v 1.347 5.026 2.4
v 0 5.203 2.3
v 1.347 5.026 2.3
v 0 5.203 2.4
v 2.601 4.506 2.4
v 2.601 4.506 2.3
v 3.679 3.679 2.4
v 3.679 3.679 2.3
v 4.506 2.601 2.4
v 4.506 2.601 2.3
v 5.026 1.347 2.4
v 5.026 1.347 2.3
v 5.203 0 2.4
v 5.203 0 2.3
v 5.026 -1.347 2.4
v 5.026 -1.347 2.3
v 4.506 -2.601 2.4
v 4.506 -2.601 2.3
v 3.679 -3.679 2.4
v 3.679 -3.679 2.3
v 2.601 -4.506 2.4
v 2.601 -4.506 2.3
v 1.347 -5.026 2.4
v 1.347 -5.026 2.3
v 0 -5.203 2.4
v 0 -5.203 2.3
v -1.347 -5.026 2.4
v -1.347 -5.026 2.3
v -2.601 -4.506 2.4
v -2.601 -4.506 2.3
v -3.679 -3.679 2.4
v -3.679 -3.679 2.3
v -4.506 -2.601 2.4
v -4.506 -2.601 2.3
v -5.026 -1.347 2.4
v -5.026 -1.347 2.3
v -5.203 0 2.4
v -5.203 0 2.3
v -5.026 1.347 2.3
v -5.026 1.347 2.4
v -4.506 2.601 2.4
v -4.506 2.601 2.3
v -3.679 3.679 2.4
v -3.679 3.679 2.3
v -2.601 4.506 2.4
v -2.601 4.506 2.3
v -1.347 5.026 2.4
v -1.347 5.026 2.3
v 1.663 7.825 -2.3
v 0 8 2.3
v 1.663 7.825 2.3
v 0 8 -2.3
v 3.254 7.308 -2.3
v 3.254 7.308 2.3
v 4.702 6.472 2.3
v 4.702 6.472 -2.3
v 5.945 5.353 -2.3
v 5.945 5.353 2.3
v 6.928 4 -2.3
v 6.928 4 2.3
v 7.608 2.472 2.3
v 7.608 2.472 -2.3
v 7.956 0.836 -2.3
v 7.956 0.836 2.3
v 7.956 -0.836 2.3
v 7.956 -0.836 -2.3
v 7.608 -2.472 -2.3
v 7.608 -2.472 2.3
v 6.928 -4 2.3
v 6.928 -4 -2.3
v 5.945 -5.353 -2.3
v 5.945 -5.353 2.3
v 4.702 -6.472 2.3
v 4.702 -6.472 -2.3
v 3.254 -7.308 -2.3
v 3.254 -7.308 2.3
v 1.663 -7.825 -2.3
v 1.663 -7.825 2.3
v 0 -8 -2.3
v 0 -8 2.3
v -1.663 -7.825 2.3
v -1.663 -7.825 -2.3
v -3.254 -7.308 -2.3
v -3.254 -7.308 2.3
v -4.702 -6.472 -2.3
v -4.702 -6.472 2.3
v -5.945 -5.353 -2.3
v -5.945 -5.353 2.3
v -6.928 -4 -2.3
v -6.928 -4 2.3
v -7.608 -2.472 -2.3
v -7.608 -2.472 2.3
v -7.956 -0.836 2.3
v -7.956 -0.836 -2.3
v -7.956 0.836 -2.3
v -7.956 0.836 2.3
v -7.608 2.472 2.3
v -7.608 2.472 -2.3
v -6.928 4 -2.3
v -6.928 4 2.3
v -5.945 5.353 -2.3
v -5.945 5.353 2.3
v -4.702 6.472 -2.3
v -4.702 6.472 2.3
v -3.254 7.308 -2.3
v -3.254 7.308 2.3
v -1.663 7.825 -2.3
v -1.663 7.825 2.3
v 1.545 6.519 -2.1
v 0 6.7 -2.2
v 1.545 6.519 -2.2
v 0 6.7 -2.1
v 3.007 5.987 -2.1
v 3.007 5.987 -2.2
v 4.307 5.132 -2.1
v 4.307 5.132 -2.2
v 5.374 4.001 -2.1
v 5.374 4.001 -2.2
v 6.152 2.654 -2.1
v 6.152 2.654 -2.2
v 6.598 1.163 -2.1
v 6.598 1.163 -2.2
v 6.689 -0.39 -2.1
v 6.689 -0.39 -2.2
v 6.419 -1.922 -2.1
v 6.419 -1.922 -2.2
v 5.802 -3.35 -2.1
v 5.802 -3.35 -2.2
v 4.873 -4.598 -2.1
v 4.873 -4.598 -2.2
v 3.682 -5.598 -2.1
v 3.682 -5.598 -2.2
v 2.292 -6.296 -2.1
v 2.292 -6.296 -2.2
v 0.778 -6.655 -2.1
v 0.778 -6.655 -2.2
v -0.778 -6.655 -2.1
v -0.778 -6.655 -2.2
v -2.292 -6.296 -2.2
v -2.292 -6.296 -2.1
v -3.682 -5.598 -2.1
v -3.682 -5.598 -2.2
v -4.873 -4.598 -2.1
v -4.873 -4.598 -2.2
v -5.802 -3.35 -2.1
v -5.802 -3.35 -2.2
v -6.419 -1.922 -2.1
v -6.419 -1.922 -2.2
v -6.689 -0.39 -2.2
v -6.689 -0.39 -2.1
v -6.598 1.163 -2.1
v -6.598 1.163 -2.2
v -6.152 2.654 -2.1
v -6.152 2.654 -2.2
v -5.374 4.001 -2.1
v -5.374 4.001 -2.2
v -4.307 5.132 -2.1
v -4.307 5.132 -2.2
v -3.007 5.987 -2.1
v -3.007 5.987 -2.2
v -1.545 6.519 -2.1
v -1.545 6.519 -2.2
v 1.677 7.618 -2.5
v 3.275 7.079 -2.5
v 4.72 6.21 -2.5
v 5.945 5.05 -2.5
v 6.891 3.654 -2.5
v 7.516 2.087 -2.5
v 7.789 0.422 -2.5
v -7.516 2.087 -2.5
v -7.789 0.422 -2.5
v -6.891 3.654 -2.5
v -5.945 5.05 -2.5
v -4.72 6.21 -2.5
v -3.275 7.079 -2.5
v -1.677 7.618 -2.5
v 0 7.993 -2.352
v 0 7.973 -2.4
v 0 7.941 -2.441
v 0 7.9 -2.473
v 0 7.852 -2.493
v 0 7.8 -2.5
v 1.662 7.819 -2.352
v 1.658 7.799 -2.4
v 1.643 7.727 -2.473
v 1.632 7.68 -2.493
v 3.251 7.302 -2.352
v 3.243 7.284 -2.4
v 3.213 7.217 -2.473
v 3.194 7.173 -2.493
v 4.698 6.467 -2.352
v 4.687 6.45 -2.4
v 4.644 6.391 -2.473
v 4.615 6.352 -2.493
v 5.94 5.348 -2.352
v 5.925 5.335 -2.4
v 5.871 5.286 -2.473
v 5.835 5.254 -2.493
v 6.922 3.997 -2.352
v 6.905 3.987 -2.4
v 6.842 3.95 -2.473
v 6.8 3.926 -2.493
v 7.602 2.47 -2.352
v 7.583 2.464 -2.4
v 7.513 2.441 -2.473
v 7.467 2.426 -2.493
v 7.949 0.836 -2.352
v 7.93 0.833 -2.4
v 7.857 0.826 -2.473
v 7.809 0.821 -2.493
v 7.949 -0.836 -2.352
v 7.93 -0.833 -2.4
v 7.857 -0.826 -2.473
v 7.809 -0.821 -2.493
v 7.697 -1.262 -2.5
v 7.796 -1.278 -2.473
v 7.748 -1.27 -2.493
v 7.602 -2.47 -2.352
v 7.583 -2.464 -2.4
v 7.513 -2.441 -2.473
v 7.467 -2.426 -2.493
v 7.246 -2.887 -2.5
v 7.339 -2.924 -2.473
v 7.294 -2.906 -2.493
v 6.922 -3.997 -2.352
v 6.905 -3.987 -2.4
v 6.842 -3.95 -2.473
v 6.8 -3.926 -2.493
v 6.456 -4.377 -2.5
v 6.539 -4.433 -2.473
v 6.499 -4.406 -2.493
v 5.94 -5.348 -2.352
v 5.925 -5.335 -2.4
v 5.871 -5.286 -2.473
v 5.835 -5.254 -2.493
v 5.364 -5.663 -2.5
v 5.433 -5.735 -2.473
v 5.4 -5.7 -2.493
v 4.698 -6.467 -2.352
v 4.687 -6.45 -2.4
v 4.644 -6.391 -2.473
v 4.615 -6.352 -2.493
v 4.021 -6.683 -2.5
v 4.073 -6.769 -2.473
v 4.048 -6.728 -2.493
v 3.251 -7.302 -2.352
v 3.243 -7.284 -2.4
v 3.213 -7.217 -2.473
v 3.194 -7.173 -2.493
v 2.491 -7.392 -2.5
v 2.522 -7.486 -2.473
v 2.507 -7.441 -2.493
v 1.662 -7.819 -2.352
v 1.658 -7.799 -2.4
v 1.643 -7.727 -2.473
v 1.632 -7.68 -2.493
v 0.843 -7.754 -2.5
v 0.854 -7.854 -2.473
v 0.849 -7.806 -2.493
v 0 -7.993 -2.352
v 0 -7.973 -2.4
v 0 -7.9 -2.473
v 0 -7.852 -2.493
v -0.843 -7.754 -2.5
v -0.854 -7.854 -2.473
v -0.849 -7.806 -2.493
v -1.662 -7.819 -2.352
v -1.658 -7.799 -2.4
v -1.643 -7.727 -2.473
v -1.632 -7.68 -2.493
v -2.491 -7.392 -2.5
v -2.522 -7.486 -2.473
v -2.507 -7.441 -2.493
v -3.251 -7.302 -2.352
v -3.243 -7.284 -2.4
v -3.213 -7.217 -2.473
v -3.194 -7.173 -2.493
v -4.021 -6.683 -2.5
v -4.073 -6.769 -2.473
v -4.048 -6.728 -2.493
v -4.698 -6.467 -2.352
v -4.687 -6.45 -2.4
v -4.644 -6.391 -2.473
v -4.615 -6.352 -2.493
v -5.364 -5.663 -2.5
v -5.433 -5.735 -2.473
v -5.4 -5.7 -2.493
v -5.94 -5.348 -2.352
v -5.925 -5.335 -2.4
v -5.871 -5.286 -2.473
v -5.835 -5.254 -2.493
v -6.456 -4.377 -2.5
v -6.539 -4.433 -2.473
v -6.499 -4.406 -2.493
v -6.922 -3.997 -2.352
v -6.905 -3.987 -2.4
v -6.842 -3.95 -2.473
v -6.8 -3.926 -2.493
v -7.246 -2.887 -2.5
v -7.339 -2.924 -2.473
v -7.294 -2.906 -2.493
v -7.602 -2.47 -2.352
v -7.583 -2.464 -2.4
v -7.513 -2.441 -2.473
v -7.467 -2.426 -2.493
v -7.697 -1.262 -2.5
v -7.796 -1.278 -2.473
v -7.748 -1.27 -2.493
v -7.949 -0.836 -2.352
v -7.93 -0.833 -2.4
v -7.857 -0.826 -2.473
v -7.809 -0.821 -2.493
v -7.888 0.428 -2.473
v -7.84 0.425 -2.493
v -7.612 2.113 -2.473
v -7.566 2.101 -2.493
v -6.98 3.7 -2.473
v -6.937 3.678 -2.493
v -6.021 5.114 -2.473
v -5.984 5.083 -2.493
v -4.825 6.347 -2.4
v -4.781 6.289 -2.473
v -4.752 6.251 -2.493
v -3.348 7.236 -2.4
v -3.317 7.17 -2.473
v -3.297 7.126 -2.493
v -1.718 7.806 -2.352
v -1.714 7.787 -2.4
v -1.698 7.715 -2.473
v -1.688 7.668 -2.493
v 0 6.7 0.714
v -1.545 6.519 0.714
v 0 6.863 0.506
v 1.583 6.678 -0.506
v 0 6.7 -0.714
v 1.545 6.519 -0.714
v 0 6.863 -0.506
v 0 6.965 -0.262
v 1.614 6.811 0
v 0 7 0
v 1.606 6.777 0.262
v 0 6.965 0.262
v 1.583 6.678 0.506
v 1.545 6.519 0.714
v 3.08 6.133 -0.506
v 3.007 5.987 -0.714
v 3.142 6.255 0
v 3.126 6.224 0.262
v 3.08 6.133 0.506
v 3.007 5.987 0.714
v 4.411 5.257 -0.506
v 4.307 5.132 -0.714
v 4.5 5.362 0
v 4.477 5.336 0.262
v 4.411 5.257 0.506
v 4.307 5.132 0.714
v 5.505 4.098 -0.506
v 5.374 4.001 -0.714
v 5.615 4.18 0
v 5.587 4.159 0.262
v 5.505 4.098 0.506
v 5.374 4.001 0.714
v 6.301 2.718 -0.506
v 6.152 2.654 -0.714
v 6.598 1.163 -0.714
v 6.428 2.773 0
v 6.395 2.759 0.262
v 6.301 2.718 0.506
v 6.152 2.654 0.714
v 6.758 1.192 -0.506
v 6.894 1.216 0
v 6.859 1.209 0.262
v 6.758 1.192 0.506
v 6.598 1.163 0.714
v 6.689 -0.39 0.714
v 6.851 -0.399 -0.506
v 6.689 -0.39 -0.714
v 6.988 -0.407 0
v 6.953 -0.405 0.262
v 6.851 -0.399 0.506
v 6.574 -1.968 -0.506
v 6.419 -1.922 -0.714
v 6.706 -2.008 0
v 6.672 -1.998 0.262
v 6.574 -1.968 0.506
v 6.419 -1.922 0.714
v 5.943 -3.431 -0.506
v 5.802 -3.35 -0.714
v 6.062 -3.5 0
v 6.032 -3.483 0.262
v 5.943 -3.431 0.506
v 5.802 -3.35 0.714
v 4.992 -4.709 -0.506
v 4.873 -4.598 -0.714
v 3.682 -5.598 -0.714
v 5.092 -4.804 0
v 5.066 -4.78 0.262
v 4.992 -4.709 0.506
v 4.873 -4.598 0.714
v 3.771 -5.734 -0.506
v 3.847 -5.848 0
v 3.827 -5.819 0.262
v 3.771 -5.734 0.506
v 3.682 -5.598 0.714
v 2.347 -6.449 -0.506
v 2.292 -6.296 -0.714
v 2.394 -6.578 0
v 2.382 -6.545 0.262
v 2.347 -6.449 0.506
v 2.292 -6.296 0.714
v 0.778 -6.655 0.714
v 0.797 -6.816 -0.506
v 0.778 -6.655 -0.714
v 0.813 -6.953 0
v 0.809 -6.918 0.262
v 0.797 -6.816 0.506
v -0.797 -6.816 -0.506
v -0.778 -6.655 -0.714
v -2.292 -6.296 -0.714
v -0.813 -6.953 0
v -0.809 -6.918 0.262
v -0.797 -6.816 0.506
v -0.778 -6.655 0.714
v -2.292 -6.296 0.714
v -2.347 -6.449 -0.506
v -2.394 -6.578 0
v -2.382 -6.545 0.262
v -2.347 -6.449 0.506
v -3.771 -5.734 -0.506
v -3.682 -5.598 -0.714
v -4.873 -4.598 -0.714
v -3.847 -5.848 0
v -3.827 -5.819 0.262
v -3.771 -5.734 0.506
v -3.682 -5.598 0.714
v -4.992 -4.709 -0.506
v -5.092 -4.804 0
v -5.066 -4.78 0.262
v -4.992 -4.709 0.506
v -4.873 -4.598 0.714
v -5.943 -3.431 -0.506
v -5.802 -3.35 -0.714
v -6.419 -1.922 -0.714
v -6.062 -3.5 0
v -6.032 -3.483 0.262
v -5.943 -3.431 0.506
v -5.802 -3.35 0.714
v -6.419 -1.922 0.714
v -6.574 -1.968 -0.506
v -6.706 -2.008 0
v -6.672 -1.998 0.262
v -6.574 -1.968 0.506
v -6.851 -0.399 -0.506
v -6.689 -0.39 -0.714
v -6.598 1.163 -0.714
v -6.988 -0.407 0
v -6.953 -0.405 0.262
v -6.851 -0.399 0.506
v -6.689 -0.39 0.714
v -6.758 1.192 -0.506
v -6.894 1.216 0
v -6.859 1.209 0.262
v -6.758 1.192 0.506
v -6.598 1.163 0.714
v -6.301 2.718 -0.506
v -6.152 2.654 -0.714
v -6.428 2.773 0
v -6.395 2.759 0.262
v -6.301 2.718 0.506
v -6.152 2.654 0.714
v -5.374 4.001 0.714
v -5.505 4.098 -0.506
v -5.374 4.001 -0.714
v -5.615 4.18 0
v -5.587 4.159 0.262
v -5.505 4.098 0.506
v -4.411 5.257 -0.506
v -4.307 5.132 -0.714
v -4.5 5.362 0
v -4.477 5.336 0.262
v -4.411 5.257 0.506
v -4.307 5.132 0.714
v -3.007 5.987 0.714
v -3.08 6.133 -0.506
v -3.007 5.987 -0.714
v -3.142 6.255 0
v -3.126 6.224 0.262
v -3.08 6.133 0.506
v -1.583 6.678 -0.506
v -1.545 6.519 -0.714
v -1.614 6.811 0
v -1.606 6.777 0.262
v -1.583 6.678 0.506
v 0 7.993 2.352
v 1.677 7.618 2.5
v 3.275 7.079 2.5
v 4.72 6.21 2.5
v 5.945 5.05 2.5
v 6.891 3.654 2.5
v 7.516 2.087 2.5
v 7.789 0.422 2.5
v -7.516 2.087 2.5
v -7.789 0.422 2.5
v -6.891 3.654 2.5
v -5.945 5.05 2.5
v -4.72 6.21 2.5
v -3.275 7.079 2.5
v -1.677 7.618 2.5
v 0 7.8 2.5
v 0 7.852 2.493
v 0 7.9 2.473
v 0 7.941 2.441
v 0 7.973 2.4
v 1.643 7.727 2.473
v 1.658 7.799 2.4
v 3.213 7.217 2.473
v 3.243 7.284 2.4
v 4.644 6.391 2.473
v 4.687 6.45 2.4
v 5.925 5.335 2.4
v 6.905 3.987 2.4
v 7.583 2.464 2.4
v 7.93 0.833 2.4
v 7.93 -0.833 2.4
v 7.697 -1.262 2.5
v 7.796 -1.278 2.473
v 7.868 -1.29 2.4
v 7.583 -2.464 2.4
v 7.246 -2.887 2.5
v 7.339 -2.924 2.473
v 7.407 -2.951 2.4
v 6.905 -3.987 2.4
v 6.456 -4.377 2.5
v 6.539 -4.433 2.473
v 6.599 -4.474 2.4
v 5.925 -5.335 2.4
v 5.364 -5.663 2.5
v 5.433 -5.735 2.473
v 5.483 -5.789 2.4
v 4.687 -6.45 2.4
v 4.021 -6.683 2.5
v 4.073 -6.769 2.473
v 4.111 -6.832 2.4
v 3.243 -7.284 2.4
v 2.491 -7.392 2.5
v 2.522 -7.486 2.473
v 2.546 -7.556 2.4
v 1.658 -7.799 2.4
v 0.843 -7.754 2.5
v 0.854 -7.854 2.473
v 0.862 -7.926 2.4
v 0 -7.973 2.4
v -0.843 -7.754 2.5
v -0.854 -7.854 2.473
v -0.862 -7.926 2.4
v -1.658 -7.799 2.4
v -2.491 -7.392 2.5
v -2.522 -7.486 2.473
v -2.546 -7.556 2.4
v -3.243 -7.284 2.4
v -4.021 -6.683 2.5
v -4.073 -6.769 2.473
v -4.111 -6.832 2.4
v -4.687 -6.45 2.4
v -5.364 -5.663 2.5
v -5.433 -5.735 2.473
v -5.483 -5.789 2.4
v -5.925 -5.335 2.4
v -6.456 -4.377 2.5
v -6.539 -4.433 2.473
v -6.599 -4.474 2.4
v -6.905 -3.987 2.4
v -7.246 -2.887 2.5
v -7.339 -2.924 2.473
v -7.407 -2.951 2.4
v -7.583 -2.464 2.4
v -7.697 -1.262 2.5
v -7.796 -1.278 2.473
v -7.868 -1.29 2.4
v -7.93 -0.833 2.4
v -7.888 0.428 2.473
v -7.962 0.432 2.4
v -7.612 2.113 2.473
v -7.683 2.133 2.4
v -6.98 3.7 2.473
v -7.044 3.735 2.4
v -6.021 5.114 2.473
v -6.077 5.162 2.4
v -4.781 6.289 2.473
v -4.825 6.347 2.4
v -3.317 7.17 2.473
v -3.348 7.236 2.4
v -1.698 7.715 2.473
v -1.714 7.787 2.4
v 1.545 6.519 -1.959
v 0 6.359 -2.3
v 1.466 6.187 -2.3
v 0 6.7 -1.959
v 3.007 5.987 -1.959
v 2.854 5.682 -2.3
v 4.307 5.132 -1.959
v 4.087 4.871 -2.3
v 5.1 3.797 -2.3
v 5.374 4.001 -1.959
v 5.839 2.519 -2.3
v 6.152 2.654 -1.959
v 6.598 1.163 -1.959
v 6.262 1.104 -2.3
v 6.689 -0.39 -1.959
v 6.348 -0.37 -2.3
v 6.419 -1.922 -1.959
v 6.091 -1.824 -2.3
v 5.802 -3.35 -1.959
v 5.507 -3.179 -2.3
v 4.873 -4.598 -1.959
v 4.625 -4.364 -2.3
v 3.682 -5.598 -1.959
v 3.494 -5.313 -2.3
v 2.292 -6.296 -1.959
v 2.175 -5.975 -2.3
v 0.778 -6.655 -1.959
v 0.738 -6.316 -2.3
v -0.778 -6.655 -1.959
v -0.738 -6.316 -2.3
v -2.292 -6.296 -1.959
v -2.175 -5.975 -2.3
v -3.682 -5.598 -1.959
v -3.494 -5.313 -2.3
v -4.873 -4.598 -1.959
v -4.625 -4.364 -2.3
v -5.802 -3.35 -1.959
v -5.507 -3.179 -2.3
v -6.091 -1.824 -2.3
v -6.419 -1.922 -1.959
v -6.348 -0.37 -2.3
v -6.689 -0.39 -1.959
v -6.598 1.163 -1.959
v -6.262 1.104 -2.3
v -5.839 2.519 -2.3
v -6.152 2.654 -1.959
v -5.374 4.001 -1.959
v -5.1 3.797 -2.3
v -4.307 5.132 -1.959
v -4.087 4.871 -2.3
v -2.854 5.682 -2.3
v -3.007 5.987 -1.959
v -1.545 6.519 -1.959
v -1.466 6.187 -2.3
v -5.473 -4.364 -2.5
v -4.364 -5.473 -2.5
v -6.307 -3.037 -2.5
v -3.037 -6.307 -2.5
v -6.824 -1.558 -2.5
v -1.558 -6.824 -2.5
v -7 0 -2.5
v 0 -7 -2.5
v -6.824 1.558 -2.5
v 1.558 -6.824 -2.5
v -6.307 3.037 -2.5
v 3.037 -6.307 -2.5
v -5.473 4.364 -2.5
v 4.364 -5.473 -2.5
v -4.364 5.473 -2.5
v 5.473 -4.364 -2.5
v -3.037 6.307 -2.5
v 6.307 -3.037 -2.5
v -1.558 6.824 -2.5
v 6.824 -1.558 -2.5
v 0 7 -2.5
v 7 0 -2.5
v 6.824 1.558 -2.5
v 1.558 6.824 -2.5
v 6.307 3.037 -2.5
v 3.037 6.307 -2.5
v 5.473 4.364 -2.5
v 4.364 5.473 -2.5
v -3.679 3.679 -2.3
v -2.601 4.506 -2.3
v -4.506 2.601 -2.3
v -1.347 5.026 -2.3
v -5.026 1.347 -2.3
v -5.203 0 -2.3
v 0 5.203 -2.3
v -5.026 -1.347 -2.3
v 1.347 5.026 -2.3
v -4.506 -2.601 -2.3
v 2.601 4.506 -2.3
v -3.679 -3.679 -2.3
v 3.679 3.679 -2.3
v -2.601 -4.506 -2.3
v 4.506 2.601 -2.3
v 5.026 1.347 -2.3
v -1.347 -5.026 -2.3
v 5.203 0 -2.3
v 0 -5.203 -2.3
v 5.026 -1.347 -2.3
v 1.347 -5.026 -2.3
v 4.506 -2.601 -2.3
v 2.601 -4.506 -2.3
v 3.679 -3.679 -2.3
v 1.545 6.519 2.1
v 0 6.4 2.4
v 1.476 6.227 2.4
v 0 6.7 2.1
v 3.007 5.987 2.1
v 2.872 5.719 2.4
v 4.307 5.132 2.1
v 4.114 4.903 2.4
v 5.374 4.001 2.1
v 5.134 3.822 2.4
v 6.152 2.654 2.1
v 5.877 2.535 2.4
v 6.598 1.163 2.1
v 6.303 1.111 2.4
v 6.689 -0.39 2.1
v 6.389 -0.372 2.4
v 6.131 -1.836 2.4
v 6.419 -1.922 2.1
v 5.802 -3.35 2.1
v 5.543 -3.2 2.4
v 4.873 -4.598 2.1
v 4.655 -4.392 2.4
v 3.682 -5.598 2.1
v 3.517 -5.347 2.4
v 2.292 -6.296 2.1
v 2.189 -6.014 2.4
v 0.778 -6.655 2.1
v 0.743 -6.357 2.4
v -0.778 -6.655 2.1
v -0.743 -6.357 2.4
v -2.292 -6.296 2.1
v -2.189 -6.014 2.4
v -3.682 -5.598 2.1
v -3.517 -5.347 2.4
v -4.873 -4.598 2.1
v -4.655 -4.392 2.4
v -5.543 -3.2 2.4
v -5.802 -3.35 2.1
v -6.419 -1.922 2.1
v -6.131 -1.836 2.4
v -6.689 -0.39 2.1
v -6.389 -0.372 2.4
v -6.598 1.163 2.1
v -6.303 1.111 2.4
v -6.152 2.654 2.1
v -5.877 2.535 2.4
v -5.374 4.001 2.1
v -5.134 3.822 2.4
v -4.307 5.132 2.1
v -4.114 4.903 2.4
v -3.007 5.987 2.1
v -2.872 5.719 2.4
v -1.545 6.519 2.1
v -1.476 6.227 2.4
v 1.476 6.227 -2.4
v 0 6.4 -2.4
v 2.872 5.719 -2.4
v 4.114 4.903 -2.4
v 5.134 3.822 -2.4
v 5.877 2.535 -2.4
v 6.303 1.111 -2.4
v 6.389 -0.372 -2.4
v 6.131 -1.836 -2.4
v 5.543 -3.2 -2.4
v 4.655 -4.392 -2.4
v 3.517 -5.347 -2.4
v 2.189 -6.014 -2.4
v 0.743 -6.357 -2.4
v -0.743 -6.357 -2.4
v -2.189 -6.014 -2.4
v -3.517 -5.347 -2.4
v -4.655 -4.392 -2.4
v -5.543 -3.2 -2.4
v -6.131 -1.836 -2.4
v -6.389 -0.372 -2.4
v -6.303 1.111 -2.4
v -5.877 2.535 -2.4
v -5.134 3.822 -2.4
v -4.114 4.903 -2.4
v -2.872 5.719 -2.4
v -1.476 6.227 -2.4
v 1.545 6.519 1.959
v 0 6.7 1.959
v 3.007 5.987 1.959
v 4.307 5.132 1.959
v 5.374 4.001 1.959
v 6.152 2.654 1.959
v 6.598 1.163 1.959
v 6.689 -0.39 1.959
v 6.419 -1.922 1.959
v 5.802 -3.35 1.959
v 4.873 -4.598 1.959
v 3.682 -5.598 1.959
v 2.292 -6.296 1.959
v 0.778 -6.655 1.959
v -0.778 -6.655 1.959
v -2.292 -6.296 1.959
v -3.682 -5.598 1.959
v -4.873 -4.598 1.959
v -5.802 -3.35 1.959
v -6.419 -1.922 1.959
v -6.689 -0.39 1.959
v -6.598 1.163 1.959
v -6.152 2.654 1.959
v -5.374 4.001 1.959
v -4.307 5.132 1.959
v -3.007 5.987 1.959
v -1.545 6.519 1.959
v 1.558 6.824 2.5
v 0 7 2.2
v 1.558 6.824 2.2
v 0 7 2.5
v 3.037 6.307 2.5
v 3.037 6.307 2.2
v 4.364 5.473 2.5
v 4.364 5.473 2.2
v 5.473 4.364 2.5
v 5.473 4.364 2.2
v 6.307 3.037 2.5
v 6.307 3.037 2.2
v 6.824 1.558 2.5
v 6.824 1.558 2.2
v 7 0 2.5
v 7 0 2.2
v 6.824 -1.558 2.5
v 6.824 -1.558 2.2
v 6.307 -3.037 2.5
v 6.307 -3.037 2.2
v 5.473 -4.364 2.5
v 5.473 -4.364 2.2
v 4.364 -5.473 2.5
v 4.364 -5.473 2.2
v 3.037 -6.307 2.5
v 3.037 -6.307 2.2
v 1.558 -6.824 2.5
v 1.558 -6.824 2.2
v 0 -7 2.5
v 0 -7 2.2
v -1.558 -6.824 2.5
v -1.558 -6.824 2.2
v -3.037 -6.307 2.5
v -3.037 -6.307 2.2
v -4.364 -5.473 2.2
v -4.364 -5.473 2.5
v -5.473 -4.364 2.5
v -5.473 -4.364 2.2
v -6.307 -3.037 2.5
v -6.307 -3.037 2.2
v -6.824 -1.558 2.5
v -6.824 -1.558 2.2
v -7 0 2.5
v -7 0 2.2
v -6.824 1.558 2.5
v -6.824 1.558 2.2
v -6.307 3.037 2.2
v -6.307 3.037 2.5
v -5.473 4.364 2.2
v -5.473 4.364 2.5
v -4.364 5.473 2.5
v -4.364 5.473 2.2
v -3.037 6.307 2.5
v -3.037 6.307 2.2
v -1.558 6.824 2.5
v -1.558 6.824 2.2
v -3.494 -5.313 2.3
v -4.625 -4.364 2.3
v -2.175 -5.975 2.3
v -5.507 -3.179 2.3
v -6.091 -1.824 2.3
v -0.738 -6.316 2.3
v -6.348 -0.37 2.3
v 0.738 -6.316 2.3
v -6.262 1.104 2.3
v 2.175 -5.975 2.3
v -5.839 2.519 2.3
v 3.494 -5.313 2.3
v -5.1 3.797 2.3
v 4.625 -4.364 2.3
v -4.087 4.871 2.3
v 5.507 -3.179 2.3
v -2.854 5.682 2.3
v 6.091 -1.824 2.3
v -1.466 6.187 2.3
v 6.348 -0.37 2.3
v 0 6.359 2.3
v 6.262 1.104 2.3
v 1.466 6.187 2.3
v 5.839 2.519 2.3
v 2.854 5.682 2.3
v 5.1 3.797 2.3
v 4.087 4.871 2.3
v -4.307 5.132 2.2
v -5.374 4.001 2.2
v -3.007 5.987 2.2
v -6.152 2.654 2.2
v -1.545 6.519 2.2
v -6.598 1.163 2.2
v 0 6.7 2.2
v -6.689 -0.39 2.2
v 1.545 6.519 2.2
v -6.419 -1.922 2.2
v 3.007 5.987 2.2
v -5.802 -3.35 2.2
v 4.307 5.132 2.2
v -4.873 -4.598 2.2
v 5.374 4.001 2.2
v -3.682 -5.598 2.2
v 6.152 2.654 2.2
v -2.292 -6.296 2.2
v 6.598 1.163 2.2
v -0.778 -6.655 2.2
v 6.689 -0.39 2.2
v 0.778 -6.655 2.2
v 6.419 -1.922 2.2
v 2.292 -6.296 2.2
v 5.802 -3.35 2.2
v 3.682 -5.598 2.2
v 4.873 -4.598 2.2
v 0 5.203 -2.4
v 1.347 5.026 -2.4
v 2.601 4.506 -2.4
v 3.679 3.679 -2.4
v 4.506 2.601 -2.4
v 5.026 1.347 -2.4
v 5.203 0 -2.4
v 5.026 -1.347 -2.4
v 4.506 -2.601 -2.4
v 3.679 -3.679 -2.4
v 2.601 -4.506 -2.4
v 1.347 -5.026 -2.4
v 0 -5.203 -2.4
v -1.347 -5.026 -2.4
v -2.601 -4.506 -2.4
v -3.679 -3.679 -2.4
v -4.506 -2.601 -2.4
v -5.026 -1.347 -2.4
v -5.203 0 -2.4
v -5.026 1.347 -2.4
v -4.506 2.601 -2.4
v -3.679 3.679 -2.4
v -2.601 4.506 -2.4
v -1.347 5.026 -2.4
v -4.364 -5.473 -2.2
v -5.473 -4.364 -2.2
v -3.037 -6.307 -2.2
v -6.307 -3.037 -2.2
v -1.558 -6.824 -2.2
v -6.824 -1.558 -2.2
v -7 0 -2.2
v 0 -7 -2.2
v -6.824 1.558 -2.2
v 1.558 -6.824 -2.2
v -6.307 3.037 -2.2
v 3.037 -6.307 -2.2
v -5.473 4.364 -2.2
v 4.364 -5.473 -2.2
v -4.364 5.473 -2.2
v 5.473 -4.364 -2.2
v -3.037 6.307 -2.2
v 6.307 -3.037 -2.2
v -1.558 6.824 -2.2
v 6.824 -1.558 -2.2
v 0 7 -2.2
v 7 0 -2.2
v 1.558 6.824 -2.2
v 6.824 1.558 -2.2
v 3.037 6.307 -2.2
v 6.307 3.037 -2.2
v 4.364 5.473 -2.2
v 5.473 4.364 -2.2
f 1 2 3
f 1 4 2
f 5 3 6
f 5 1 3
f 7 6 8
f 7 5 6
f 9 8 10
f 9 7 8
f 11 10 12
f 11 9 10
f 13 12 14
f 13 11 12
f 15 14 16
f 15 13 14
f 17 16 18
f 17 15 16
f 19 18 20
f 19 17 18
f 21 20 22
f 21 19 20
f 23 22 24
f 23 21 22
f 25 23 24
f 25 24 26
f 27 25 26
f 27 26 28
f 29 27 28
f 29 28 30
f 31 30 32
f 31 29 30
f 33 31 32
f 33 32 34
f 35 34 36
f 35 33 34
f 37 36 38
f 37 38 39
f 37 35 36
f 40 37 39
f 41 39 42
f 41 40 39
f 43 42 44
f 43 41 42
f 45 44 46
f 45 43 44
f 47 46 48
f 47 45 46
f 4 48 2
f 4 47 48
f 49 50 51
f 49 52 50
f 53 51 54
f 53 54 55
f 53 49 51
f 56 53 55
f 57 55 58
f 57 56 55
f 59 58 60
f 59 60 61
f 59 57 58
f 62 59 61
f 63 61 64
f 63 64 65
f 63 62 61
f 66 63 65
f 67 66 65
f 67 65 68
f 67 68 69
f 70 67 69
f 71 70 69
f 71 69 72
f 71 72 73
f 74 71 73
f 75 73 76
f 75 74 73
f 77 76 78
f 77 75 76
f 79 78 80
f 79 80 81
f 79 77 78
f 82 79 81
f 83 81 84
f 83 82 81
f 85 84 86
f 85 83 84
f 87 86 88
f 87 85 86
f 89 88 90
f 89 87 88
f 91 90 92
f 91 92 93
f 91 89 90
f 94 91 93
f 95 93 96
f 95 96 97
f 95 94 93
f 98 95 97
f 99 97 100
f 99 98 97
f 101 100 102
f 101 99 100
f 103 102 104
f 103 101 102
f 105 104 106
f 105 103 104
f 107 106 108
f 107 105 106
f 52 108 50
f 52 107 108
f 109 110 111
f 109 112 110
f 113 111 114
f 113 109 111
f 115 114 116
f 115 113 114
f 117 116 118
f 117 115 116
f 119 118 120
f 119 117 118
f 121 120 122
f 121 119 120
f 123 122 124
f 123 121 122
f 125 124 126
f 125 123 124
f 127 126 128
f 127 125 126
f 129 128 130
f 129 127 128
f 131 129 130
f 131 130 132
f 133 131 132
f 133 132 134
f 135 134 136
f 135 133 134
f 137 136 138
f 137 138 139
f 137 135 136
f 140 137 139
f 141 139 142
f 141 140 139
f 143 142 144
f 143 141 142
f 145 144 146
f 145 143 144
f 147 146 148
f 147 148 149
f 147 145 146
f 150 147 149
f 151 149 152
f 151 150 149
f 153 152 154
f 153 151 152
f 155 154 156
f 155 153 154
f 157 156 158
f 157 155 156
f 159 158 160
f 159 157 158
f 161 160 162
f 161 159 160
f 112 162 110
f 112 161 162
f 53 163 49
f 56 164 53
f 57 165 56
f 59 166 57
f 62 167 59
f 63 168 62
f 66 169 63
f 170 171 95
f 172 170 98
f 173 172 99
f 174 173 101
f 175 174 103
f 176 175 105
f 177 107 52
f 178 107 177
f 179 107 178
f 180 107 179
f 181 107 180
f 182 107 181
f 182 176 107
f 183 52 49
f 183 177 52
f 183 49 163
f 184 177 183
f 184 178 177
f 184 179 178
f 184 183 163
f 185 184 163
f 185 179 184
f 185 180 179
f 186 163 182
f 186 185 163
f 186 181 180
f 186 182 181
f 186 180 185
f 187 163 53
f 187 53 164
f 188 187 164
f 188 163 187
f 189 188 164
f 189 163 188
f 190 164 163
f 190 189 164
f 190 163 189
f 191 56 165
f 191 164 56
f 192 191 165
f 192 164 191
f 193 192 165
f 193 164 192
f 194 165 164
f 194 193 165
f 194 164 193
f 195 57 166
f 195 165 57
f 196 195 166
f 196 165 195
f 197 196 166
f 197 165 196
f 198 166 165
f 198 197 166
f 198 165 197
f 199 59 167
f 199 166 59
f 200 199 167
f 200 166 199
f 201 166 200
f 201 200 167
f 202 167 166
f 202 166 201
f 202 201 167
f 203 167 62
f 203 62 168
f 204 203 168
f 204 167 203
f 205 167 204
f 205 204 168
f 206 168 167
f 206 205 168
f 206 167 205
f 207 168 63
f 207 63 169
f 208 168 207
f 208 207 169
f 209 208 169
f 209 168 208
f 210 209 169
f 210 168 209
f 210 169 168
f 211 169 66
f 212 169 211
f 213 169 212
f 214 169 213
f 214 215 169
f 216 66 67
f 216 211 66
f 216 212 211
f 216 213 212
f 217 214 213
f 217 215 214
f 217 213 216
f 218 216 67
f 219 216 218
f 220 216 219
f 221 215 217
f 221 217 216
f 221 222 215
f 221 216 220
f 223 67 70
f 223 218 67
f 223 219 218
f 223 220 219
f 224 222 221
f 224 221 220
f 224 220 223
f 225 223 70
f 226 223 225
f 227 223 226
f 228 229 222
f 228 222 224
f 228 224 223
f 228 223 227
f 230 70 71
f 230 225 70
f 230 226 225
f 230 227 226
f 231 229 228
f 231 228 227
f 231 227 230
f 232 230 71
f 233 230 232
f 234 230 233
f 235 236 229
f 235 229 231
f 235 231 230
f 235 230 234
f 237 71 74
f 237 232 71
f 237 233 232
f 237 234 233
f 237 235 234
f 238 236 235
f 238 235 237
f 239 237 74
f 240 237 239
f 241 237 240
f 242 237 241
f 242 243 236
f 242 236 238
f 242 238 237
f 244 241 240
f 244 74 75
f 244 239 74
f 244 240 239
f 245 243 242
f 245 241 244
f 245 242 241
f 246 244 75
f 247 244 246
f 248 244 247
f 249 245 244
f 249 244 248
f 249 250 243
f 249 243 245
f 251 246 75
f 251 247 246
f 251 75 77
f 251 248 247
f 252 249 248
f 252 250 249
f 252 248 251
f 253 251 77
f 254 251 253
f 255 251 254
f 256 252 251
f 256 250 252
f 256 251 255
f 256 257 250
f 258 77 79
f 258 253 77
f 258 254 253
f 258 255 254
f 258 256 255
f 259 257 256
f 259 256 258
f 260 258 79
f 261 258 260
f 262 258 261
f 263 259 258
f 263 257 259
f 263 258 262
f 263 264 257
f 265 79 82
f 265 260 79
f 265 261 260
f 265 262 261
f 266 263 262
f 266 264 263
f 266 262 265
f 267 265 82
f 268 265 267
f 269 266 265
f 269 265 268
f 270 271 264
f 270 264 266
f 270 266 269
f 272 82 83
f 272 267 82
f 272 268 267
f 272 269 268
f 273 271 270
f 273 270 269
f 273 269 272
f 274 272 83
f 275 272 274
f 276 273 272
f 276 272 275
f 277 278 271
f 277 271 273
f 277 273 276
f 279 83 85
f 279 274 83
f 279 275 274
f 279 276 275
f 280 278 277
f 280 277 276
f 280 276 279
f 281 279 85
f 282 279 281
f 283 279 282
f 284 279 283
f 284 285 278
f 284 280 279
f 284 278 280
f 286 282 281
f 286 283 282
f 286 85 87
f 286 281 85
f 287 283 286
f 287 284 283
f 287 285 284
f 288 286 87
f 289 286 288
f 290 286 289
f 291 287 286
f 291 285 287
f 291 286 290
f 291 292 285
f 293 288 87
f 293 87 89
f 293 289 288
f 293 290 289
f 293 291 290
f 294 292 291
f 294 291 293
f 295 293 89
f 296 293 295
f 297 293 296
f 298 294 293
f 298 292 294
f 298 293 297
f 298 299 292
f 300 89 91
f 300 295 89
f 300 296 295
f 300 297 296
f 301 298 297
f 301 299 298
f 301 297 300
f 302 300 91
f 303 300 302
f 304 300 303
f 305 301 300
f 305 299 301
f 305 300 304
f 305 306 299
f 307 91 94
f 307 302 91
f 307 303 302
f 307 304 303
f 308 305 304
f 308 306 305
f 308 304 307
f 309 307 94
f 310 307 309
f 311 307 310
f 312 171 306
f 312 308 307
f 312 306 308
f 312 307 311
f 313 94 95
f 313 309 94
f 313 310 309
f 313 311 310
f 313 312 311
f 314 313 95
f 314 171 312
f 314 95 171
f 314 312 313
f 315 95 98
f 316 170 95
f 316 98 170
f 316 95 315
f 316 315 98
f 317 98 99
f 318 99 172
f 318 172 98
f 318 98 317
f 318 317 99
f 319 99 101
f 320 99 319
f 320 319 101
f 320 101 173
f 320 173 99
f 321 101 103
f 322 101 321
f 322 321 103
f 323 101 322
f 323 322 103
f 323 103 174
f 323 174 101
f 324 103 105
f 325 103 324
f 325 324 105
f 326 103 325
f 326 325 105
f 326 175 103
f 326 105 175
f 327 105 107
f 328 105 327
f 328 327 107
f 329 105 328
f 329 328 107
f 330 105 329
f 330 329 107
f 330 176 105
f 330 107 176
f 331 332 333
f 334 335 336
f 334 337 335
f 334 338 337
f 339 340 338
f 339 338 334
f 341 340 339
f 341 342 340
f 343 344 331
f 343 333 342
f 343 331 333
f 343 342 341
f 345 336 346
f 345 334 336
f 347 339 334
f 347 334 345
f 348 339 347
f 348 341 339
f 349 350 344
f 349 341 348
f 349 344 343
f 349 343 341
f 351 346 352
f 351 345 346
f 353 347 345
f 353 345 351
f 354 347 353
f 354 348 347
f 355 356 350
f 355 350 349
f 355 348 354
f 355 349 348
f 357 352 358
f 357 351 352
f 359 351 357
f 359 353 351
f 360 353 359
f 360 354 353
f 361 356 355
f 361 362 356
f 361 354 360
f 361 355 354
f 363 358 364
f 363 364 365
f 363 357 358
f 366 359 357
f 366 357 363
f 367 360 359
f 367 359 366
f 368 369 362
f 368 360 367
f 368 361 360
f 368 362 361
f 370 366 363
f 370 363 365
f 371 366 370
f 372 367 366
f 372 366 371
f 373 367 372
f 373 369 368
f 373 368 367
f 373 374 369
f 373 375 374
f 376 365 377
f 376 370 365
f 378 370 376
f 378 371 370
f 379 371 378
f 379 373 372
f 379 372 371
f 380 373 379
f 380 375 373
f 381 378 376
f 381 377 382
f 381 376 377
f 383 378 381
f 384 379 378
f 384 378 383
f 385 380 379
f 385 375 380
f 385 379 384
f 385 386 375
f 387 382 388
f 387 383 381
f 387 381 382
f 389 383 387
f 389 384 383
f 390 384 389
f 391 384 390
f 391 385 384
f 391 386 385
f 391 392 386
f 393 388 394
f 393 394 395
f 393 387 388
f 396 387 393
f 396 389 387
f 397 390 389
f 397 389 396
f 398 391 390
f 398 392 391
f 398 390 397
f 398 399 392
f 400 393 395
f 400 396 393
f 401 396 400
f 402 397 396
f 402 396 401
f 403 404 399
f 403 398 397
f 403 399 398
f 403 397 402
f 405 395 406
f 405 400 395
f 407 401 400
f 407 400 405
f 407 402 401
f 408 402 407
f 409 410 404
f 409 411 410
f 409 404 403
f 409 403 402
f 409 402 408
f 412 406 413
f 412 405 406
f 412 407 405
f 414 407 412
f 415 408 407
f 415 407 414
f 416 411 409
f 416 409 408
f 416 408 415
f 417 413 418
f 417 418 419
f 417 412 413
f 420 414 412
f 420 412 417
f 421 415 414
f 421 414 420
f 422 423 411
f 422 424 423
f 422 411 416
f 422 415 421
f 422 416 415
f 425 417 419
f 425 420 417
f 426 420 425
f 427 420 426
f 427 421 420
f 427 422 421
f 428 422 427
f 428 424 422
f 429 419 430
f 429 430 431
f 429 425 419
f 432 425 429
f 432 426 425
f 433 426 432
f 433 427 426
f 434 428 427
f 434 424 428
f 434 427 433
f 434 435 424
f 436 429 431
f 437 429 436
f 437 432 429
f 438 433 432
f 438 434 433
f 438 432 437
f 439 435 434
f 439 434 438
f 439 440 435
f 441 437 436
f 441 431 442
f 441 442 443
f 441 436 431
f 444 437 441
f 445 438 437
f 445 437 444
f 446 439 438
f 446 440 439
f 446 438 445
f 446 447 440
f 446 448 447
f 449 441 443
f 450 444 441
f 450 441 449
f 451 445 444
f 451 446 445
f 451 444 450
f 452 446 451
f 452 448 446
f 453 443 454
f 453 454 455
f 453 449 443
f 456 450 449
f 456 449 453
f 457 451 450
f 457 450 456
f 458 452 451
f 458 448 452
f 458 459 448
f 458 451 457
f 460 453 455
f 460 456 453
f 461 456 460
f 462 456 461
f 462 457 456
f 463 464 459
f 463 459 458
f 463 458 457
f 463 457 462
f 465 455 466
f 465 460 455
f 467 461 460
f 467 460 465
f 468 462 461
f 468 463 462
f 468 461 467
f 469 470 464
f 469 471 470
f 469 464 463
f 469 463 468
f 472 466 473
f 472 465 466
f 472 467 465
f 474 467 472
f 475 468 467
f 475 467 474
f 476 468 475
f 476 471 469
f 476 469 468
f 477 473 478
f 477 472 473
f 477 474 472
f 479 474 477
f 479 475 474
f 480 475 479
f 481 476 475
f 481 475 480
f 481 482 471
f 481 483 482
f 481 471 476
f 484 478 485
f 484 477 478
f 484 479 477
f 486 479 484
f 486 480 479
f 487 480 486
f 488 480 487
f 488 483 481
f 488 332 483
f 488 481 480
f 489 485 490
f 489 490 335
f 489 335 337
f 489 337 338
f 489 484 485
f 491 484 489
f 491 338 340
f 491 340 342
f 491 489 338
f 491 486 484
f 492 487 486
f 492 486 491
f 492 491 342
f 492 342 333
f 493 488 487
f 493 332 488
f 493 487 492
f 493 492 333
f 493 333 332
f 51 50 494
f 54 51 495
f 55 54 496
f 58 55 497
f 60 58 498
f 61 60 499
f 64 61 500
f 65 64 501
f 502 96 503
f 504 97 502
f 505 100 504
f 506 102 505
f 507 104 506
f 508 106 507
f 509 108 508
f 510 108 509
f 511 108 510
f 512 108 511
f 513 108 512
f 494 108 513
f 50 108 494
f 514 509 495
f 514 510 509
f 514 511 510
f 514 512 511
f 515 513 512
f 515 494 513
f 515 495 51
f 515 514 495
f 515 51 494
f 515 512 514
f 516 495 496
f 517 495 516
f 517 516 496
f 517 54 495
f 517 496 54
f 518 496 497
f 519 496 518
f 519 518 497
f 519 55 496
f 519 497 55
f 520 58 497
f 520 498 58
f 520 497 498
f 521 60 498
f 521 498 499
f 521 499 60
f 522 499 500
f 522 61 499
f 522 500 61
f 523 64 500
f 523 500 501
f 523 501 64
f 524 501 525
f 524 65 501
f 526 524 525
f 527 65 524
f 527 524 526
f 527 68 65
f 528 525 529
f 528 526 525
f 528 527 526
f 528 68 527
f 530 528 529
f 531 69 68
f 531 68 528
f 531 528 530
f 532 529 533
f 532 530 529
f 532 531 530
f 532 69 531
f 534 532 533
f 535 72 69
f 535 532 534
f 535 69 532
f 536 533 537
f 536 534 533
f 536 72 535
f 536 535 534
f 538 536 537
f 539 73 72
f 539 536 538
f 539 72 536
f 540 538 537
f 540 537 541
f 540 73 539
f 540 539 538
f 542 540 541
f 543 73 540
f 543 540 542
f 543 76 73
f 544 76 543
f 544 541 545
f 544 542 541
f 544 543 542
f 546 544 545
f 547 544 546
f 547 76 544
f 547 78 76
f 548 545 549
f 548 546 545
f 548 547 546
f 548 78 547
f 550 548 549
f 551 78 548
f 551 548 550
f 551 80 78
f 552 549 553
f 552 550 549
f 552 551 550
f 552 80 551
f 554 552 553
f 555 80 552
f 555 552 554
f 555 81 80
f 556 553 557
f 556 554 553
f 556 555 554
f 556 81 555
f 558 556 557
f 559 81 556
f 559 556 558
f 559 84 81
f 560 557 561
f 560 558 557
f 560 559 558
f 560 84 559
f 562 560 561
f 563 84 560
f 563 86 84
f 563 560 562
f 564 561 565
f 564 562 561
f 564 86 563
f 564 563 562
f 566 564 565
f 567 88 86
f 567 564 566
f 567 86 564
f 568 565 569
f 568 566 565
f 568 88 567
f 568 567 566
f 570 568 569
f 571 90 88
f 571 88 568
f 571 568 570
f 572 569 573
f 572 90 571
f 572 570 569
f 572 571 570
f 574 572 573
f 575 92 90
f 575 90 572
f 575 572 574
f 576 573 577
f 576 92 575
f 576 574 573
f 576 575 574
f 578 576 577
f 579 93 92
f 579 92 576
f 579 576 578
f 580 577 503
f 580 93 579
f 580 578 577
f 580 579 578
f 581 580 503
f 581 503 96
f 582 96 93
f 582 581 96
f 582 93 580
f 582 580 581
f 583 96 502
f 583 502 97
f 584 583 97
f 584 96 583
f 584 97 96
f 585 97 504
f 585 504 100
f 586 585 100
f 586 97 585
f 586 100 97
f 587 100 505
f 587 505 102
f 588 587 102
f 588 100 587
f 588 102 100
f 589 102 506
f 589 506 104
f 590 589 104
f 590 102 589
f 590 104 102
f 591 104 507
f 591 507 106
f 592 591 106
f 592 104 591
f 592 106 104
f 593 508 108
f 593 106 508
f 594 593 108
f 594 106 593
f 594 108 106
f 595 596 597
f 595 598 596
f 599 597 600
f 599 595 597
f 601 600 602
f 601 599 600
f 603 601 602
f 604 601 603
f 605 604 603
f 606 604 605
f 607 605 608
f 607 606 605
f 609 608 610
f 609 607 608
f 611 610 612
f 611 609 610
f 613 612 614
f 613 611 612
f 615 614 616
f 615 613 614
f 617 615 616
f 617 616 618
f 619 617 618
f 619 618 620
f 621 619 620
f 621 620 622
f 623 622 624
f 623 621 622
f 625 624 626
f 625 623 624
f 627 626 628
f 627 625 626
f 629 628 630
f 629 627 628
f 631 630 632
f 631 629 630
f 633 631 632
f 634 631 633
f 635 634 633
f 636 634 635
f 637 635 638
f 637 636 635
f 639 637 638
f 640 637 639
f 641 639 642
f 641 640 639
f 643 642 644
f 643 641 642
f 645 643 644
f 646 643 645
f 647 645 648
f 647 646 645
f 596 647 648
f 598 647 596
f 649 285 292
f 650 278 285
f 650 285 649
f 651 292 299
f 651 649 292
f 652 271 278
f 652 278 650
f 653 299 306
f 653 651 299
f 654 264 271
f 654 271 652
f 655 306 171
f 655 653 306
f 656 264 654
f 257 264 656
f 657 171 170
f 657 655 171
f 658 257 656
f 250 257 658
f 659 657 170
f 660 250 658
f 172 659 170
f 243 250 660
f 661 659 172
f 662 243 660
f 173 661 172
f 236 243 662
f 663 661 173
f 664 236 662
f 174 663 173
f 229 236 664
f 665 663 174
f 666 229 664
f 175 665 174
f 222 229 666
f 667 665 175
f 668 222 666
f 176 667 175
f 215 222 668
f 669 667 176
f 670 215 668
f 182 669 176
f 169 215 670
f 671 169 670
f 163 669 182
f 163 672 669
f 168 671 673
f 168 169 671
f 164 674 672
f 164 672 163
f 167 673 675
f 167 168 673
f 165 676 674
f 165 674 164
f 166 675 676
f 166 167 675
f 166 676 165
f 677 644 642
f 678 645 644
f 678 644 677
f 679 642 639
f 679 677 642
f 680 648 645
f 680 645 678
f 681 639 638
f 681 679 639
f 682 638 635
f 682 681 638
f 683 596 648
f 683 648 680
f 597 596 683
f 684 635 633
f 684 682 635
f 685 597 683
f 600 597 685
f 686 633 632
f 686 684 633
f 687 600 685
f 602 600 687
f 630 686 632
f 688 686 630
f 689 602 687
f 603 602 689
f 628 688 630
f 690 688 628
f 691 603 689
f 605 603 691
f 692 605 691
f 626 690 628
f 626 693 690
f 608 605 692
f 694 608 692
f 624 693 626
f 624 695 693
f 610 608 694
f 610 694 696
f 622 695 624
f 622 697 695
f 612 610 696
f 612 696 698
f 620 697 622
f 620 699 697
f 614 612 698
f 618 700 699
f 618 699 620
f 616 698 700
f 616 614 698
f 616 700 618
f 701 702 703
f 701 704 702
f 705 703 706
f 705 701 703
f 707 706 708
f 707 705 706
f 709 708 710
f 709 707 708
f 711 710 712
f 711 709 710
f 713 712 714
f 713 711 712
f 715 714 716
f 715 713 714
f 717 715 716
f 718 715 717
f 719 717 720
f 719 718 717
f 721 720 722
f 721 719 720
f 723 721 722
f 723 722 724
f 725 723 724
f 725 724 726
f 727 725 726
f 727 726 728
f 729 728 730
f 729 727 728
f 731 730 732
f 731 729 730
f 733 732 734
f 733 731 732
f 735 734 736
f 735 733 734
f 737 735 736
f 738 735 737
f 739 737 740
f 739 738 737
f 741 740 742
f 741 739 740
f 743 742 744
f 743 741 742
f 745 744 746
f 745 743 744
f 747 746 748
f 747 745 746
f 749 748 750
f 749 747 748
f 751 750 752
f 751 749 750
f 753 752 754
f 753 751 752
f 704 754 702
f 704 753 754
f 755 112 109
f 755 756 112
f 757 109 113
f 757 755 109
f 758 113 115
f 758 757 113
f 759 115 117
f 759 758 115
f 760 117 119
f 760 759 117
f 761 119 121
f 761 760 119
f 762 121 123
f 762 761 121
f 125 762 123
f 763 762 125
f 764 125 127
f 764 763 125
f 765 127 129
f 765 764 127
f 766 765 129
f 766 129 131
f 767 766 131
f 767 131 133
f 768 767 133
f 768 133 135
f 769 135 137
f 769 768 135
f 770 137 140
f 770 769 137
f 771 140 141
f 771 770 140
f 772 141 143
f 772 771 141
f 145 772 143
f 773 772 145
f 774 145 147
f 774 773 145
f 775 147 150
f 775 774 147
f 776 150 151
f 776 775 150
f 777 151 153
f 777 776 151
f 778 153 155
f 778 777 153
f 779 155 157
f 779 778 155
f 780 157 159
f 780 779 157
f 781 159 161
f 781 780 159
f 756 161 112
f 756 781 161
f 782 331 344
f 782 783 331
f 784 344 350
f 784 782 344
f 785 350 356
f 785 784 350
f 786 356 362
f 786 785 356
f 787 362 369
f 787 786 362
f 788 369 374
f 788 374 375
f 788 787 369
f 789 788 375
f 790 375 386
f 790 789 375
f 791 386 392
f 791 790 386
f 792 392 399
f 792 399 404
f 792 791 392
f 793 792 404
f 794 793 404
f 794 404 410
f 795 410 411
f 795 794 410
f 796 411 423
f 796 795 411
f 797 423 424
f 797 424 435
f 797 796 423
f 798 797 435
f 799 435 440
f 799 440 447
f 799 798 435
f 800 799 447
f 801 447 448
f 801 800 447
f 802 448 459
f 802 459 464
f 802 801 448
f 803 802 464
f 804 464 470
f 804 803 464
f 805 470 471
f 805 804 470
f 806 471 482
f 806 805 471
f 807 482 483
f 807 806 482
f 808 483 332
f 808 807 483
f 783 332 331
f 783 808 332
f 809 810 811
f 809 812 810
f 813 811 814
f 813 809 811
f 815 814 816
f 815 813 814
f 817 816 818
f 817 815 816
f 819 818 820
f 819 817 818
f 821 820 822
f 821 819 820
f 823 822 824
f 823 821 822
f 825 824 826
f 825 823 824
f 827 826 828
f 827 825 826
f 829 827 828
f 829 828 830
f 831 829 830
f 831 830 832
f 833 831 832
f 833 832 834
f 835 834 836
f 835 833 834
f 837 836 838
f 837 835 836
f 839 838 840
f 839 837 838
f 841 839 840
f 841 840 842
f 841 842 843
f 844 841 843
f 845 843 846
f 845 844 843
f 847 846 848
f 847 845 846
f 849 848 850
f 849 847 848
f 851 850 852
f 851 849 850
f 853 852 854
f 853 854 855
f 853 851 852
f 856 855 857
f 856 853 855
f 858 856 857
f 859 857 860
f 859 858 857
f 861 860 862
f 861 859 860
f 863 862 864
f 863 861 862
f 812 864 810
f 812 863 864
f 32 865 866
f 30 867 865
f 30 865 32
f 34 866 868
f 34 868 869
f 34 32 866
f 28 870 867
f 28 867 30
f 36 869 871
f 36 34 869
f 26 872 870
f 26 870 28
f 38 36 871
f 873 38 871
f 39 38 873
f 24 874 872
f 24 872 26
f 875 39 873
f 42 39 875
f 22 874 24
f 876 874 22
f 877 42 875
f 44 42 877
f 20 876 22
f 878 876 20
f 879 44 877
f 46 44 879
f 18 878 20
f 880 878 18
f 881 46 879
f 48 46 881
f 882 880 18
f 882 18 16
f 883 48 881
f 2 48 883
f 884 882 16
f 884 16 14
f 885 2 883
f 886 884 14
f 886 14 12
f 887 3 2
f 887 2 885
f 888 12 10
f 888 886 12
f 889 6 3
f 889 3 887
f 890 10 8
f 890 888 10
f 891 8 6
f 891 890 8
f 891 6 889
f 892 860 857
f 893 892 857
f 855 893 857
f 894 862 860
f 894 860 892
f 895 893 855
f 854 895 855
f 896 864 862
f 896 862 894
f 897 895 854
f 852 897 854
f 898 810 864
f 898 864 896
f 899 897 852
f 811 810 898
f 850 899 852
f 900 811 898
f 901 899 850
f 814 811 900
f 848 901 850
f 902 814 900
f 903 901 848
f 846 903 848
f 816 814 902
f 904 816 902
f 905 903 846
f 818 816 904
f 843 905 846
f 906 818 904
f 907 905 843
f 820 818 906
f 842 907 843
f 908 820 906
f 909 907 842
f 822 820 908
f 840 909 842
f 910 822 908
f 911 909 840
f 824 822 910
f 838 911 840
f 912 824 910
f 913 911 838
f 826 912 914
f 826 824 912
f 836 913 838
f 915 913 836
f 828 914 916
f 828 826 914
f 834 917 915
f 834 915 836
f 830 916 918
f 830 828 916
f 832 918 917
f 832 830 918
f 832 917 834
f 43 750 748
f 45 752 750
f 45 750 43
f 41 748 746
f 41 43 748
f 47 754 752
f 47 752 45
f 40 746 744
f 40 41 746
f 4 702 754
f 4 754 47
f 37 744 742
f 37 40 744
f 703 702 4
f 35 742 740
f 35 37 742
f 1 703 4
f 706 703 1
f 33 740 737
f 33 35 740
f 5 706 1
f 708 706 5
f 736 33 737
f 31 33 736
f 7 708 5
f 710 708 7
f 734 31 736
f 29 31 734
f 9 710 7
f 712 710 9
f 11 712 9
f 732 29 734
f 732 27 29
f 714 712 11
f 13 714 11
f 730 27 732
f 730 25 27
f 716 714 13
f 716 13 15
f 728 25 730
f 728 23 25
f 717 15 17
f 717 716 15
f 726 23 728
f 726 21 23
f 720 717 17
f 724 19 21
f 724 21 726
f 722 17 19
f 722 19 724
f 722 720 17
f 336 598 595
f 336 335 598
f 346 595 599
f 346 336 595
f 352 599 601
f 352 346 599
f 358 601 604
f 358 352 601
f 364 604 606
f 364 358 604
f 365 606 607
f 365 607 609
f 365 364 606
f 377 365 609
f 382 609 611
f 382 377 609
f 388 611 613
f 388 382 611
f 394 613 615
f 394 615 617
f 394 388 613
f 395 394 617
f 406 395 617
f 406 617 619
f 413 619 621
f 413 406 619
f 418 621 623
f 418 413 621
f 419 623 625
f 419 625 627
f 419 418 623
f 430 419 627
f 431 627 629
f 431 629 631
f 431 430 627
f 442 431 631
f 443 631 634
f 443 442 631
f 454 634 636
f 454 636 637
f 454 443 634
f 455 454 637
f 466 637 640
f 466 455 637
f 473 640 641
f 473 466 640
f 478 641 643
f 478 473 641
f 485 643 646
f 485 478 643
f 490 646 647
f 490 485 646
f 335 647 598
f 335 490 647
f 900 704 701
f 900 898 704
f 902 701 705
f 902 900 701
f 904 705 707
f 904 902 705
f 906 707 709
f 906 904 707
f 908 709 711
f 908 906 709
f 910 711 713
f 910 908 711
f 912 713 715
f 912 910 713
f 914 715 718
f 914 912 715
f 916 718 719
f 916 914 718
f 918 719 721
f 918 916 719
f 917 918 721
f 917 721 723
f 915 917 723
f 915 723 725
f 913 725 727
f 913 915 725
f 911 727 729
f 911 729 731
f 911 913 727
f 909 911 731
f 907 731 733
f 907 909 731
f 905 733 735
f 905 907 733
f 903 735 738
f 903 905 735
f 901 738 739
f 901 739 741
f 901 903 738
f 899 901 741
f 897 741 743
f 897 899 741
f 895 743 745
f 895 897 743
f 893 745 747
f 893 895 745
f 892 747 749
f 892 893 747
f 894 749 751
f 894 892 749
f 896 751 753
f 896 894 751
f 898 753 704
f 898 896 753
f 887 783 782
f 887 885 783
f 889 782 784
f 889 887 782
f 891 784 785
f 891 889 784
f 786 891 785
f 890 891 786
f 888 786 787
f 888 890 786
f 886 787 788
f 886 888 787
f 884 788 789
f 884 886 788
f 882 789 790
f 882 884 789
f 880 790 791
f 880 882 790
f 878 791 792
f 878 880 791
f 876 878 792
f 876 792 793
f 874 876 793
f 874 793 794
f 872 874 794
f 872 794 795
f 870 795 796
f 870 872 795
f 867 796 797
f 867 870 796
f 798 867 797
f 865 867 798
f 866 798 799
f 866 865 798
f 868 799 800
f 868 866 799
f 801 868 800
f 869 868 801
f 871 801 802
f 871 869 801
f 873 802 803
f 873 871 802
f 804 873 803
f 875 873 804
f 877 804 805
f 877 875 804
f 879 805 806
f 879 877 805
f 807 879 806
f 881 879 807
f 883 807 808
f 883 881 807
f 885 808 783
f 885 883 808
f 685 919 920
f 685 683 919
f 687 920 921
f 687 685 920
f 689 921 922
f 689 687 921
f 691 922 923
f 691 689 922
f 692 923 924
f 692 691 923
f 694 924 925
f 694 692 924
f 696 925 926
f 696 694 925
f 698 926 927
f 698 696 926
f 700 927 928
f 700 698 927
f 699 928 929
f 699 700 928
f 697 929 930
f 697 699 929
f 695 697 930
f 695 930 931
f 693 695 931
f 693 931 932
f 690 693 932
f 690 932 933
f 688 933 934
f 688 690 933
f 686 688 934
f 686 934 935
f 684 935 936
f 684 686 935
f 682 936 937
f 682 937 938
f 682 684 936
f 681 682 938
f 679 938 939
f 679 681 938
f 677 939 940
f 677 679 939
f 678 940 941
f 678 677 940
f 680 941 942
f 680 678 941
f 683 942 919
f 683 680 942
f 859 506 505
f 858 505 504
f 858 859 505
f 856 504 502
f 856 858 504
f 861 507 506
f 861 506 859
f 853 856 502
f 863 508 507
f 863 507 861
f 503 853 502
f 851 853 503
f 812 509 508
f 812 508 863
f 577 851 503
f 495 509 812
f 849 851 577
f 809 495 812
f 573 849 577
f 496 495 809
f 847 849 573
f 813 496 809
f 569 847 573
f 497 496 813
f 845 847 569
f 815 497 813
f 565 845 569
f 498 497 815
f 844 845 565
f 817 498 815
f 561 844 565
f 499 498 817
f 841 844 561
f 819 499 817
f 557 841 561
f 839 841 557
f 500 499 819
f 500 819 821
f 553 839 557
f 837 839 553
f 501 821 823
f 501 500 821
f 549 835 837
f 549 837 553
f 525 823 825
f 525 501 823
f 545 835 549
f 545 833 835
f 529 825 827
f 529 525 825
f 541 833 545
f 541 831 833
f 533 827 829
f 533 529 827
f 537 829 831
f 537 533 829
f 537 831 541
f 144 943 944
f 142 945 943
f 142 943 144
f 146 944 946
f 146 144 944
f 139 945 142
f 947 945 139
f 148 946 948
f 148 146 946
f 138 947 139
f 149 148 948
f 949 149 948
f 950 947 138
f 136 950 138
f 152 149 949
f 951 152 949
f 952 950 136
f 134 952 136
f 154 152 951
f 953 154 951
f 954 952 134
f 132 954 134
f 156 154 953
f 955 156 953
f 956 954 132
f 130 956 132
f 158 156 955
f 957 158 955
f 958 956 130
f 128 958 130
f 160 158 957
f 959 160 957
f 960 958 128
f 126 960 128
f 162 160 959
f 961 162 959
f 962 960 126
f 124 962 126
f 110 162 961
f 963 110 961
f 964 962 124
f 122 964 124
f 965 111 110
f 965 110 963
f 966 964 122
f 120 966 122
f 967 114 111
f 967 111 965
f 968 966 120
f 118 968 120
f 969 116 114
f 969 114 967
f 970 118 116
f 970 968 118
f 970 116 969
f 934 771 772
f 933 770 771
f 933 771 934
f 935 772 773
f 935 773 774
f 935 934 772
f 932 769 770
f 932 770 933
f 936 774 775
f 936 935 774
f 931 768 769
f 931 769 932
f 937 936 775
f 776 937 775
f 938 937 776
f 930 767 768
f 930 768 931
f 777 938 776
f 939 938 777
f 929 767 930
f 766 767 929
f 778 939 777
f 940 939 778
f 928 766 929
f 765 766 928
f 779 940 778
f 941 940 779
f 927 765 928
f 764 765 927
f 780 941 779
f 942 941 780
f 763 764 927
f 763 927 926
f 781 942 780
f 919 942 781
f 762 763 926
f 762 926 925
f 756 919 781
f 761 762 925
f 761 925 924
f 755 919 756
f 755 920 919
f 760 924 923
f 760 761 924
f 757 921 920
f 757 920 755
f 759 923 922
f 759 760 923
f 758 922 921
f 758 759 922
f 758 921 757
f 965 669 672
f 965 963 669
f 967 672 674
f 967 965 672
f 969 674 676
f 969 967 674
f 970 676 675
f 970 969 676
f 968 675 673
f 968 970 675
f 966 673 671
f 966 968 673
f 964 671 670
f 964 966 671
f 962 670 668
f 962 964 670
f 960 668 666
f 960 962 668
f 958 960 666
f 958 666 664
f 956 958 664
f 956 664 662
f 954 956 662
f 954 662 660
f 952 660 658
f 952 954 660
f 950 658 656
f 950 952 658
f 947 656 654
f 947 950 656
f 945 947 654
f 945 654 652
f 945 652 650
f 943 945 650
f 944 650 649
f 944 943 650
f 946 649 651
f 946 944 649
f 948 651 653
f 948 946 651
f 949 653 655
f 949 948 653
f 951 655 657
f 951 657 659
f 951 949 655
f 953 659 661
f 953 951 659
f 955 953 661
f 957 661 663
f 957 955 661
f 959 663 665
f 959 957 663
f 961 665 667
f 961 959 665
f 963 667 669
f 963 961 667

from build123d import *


with BuildPart() as part:
    # Sketch1 → Revolve1 (revolve)
    with BuildSketch(Plane(origin=(0, 0, 0), x_dir=(0, 0, -1), z_dir=(1, 0, 0))):
        with BuildLine():
            Line((-2.5, 7), (-2.5, 7.8))
            ThreePointArc((-2.5, 7.8), (-2.441421356, 7.941421356), (-2.3, 8))
            Line((-2.3, 8), (2.3, 8))
            ThreePointArc((2.3, 8), (2.441421356, 7.941421356), (2.5, 7.8))
            Line((2.5, 7.8), (2.5, 7))
            Line((2.5, 7), (2.2, 7))
            Line((2.2, 7), (2.2, 6.7))
            Line((2.2, 6.7), (2.1, 6.7))
            Line((2.1, 6.7), (2.4, 6.4))
            Line((2.4, 6.4), (2.4, 5.202907901))
            Line((2.4, 5.202907901), (2.3, 5.202907901))
            Line((2.3, 5.202907901), (2.3, 6.358578644))
            Line((2.3, 6.358578644), (1.958578644, 6.7))
            Line((1.958578644, 6.7), (0.714142843, 6.7))
            ThreePointArc((0.714142843, 6.7), (0, 7), (-0.714142843, 6.7))
            Line((-0.714142843, 6.7), (-1.958578644, 6.7))
            Line((-1.958578644, 6.7), (-2.3, 6.358578644))
            Line((-2.3, 6.358578644), (-2.3, 5.202907901))
            Line((-2.3, 5.202907901), (-2.4, 5.202907901))
            Line((-2.4, 5.202907901), (-2.4, 6.4))
            Line((-2.4, 6.4), (-2.1, 6.7))
            Line((-2.1, 6.7), (-2.2, 6.7))
            Line((-2.2, 6.7), (-2.2, 7))
            Line((-2.2, 7), (-2.5, 7))
        make_face()
    revolve(axis=Axis((0, 0, 6.755399071), (0, 0, -1)))


solid = part.part
